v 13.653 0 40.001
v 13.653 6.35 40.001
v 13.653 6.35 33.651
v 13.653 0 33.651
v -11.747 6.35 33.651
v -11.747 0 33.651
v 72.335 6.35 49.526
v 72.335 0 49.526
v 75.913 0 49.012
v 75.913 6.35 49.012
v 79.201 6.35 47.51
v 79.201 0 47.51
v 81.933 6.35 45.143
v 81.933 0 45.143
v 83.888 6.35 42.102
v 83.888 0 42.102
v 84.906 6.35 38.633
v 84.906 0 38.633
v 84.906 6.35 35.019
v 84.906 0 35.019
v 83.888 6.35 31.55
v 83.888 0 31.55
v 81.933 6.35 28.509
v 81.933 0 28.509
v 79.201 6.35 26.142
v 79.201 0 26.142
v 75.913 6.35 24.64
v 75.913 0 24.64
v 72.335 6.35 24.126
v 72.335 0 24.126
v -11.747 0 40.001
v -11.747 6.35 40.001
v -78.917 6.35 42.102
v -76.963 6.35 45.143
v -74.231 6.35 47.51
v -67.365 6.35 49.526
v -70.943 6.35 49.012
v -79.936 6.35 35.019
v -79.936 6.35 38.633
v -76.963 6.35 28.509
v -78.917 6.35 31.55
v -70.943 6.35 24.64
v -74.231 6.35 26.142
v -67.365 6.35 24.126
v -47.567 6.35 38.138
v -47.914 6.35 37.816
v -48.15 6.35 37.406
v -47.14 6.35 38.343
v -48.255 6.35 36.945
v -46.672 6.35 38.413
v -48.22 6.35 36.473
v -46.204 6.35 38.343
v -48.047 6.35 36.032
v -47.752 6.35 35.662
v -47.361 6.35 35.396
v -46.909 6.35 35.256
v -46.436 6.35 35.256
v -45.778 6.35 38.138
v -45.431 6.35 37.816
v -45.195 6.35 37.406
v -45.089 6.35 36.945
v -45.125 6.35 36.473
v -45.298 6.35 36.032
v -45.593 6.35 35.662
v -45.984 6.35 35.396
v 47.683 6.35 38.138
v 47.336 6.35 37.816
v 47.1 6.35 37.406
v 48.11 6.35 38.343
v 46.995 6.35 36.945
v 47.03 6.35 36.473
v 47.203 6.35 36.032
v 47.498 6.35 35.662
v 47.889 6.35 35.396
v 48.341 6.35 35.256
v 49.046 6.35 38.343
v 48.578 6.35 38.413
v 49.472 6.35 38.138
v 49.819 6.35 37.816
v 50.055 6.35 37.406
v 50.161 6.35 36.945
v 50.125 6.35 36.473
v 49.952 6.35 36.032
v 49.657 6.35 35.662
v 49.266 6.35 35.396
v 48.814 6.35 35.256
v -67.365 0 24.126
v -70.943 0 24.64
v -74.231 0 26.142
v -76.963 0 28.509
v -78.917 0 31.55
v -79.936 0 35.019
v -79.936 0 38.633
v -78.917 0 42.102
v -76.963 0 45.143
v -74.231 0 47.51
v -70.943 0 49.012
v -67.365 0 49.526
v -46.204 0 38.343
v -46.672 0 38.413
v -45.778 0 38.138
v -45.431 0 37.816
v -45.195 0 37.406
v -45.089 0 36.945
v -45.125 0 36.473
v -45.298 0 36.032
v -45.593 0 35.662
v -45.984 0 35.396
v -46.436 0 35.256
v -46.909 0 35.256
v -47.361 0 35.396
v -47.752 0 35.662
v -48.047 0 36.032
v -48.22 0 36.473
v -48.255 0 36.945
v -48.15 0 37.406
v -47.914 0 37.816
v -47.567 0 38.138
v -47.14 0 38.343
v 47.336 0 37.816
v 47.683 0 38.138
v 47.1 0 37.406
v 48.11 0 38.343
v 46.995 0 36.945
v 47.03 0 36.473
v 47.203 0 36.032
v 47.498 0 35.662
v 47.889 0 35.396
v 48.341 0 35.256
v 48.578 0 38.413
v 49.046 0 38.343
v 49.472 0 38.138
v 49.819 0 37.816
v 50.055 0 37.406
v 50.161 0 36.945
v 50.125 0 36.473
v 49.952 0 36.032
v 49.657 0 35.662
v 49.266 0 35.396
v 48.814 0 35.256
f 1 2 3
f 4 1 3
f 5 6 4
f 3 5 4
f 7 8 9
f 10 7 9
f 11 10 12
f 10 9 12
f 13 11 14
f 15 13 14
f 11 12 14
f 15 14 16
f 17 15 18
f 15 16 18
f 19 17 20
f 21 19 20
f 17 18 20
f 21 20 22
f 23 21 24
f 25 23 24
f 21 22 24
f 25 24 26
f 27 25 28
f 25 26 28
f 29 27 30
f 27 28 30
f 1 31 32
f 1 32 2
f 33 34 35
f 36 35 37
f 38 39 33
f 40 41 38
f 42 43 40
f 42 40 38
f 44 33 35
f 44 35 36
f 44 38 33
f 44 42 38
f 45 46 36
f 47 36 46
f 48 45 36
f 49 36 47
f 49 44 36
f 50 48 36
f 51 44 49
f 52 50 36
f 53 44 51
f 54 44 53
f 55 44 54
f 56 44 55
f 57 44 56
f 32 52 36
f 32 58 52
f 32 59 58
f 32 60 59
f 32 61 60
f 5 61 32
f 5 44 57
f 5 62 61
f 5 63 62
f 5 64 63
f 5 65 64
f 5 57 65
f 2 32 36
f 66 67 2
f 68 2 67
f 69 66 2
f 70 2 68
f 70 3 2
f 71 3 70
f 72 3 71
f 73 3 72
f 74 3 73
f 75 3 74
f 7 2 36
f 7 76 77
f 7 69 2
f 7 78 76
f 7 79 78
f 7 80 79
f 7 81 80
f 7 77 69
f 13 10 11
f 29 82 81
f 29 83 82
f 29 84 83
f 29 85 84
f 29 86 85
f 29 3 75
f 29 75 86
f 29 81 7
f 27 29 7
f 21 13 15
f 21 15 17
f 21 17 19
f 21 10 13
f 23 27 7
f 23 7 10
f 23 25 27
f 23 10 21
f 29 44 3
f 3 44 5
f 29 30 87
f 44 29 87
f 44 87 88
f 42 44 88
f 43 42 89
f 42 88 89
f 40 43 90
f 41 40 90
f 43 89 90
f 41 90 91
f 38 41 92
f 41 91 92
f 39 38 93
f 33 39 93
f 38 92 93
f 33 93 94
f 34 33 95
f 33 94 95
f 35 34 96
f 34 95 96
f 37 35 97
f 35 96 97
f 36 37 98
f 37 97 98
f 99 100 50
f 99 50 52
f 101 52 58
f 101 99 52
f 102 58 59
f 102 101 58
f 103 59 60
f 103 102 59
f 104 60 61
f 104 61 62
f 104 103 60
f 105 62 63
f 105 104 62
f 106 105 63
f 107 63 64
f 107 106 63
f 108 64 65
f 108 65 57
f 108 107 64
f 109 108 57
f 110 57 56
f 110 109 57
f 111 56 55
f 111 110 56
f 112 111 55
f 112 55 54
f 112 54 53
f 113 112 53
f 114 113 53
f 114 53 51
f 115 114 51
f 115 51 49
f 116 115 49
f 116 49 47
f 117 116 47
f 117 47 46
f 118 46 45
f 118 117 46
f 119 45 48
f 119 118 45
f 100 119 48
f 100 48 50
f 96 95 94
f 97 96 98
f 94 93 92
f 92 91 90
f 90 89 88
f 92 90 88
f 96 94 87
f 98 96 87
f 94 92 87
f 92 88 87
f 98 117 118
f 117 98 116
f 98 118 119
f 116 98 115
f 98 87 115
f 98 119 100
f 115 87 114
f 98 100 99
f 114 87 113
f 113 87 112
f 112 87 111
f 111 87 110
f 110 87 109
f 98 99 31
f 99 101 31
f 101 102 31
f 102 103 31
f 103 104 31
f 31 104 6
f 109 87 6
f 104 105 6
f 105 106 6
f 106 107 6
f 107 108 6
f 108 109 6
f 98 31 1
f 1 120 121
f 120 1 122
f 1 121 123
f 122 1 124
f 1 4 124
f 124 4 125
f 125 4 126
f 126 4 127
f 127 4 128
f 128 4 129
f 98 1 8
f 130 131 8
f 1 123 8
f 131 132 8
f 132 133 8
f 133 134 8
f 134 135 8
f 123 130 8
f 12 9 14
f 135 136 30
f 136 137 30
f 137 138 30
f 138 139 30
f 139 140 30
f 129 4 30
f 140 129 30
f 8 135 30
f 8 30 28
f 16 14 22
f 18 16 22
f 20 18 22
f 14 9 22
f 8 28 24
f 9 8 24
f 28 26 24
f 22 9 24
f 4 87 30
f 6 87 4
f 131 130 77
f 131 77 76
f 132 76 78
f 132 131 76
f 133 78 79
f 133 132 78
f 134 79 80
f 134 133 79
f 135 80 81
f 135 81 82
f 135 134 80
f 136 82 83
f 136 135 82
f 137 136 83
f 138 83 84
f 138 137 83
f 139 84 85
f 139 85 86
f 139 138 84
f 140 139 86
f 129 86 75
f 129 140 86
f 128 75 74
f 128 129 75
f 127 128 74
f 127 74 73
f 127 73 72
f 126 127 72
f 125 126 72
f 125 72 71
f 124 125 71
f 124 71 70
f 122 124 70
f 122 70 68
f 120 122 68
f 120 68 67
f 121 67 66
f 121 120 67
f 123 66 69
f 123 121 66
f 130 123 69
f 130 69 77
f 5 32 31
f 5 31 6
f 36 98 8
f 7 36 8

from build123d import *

# Parameters (mm, degrees)
SKETCH1_R           = 1.5875
SKETCH1_W           = 25.4
SKETCH1_H           = 6.35
BOSS_EXTRUDE1_DEPTH = 6.35


with BuildPart() as part:
    # Sketch1 → Boss-Extrude1 (new body)
    with BuildSketch(Plane(origin=(0, 0, 0), x_dir=(1, 0, 0), z_dir=(0, 1, 0))):
        with BuildLine():
            Line((72.335187692, -24.125963073), (-67.364812308, -24.125963073))
            ThreePointArc((-67.364812308, -24.125963073), (-80.064812308, -36.825963073), (-67.364812308, -49.525963073))
            Line((-67.364812308, -49.525963073), (72.335187692, -49.525963073))
            ThreePointArc((72.335187692, -49.525963073), (85.035187692, -36.825963073), (72.335187692, -24.125963073))
        make_face()
        with Locations(Location((-46.672412507, -36.825963073, 0), (0, 0, 270))):
            Circle(SKETCH1_R, mode=Mode.SUBTRACT)
        with Locations(Location((48.577587493, -36.825963073, 0), (0, 0, 270))):
            Circle(SKETCH1_R, mode=Mode.SUBTRACT)
        with Locations((0.952587493, -36.825963073)):
            Rectangle(SKETCH1_W, SKETCH1_H, mode=Mode.SUBTRACT)
    extrude(amount=BOSS_EXTRUDE1_DEPTH)


solid = part.part
